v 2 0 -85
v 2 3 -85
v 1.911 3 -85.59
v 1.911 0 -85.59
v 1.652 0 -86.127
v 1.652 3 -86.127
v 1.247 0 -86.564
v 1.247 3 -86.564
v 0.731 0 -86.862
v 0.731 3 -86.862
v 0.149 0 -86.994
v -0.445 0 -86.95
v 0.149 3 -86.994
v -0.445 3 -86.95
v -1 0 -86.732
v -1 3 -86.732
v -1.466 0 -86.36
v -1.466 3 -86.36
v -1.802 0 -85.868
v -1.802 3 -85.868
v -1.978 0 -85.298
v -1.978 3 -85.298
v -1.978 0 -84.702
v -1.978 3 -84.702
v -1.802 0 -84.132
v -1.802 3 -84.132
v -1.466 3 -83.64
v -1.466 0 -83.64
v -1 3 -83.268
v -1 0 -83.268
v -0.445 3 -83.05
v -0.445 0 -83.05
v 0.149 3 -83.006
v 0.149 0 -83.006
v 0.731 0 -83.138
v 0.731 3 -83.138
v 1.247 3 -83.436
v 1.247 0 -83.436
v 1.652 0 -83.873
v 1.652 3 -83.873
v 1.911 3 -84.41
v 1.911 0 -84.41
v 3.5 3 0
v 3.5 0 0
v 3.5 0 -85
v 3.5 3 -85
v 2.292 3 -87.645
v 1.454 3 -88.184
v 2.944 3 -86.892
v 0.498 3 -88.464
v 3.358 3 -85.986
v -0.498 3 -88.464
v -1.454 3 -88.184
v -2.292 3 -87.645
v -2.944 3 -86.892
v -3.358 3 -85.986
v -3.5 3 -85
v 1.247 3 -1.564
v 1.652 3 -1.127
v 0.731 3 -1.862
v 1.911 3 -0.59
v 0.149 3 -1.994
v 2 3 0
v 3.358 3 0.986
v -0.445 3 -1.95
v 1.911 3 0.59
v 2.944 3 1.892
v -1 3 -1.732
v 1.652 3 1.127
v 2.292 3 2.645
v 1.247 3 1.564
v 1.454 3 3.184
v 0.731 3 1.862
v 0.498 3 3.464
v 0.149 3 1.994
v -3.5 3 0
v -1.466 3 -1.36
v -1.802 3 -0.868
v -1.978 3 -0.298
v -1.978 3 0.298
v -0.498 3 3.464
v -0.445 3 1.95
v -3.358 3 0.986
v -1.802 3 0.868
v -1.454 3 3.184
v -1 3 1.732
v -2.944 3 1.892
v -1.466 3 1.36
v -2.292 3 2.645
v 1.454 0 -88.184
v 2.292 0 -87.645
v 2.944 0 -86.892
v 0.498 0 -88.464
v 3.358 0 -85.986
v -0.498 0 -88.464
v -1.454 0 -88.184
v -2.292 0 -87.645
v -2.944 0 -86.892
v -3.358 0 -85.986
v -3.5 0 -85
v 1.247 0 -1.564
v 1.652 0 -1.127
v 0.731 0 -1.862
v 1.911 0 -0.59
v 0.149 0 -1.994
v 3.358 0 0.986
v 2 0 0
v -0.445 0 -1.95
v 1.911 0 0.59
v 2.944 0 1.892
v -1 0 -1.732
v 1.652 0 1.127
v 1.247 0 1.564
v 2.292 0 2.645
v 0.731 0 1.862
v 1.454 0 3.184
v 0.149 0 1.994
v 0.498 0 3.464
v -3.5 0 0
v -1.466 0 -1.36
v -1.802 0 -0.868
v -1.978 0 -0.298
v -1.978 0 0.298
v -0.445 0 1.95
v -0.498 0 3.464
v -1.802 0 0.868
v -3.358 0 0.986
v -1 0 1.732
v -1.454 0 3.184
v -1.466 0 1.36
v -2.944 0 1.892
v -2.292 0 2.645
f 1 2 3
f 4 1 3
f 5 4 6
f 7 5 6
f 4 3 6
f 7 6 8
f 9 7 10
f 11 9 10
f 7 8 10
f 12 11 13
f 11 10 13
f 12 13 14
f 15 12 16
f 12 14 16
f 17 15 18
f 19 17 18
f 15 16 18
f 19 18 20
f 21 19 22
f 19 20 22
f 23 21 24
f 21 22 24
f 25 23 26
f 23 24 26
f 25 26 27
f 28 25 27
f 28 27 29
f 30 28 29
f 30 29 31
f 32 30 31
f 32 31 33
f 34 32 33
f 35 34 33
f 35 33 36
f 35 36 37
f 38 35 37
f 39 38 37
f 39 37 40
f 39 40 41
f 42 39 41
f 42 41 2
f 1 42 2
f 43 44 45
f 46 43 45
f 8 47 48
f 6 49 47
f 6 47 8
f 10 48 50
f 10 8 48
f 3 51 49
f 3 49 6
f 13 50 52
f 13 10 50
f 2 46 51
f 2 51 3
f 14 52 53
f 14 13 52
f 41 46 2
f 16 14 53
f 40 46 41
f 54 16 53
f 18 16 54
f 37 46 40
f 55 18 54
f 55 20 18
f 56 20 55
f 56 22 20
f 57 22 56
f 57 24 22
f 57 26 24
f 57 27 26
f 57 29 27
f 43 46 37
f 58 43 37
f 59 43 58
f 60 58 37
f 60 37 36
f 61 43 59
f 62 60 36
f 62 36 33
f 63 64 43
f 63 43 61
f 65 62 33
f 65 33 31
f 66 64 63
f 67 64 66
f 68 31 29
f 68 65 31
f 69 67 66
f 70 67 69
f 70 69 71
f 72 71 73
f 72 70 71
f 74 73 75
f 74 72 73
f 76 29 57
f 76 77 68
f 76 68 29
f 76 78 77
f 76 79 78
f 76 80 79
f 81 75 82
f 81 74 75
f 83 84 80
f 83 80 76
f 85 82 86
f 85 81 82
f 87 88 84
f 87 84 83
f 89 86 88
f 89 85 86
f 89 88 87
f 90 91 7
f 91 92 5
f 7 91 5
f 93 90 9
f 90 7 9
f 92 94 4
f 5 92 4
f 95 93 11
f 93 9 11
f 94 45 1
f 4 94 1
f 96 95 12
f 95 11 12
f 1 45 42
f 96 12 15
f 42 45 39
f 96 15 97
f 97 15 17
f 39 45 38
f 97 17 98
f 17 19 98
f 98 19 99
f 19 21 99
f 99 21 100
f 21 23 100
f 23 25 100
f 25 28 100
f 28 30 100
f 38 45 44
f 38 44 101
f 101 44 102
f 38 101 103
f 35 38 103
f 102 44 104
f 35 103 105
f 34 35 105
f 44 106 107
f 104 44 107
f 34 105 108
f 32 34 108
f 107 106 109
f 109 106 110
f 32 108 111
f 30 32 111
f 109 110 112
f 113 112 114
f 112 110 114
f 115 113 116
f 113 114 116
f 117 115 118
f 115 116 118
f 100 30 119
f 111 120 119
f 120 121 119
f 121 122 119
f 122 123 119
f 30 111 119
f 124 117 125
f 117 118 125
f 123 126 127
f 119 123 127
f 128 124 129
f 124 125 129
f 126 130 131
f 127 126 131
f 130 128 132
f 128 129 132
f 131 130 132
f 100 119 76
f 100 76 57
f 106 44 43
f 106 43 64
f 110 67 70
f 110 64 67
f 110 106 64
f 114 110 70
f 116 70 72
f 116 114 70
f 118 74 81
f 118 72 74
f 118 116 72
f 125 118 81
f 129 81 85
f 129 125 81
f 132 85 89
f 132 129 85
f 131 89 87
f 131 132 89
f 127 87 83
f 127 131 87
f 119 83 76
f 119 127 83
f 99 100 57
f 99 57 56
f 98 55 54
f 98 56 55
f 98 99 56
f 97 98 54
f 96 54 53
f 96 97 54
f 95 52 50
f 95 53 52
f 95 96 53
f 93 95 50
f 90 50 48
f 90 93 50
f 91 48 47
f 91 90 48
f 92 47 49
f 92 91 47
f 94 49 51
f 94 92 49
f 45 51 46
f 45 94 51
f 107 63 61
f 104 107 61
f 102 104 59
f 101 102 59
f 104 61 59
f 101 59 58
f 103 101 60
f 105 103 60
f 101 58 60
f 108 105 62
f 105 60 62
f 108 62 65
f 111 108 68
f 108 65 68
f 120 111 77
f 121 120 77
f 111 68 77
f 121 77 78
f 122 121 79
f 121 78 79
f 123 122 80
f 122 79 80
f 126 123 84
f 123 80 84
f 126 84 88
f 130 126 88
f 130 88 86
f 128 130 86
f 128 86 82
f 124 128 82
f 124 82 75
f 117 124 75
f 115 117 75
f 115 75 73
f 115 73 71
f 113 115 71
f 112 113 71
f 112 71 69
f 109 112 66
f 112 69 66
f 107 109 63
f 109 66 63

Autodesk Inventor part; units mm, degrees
ref_plane "YZ Plane" through (0, 0, 0) normal (1, 0, 0) x (0, 1, 0)
ref_plane "XZ Plane" through (0, 0, 0) normal (0, 1, 0) x (-1, 0, 0)
ref_plane "XY Plane" through (0, 0, 0) normal (0, 0, 1) x (1, 0, 0)
sketch "Sketch1" plane through (0, 0, 0) normal (0, 1, 0) x (-1, 0, 0)
  arc A0 (3.5, 0) -> (-3.5, 0) centre (0, 0) ccw
  arc A1 (-3.5, -85) -> (3.5, -85) centre (0, -85) ccw
  line L0 (3.5, 0) -> (3.5, -85)
  line L1 (-3.5, 0) -> (-3.5, -85)
  dimension "d0" = 7
  dimension "d1" = 7
  dimension "d9" = 85
extrude "Extrusion1" add sketch "Sketch1" along normal blind 3
sketch "Sketch2" plane through (0, 3, 0) normal (0, 1, 0) x (1, 0, 0)
  circle A0 centre (0, 0) radius 2
  circle A1 centre (0, 85) radius 2
  arc A2 (3.5, 85) -> (-3.5, 85) centre (0, 85) ccw projected
  dimension "d4" = 4
  dimension "d5" = 4
  dimension "d10" = 1.5
extrude "Extrusion2" cut sketch "Sketch2" against normal blind 3
properties part number "tay quay"
